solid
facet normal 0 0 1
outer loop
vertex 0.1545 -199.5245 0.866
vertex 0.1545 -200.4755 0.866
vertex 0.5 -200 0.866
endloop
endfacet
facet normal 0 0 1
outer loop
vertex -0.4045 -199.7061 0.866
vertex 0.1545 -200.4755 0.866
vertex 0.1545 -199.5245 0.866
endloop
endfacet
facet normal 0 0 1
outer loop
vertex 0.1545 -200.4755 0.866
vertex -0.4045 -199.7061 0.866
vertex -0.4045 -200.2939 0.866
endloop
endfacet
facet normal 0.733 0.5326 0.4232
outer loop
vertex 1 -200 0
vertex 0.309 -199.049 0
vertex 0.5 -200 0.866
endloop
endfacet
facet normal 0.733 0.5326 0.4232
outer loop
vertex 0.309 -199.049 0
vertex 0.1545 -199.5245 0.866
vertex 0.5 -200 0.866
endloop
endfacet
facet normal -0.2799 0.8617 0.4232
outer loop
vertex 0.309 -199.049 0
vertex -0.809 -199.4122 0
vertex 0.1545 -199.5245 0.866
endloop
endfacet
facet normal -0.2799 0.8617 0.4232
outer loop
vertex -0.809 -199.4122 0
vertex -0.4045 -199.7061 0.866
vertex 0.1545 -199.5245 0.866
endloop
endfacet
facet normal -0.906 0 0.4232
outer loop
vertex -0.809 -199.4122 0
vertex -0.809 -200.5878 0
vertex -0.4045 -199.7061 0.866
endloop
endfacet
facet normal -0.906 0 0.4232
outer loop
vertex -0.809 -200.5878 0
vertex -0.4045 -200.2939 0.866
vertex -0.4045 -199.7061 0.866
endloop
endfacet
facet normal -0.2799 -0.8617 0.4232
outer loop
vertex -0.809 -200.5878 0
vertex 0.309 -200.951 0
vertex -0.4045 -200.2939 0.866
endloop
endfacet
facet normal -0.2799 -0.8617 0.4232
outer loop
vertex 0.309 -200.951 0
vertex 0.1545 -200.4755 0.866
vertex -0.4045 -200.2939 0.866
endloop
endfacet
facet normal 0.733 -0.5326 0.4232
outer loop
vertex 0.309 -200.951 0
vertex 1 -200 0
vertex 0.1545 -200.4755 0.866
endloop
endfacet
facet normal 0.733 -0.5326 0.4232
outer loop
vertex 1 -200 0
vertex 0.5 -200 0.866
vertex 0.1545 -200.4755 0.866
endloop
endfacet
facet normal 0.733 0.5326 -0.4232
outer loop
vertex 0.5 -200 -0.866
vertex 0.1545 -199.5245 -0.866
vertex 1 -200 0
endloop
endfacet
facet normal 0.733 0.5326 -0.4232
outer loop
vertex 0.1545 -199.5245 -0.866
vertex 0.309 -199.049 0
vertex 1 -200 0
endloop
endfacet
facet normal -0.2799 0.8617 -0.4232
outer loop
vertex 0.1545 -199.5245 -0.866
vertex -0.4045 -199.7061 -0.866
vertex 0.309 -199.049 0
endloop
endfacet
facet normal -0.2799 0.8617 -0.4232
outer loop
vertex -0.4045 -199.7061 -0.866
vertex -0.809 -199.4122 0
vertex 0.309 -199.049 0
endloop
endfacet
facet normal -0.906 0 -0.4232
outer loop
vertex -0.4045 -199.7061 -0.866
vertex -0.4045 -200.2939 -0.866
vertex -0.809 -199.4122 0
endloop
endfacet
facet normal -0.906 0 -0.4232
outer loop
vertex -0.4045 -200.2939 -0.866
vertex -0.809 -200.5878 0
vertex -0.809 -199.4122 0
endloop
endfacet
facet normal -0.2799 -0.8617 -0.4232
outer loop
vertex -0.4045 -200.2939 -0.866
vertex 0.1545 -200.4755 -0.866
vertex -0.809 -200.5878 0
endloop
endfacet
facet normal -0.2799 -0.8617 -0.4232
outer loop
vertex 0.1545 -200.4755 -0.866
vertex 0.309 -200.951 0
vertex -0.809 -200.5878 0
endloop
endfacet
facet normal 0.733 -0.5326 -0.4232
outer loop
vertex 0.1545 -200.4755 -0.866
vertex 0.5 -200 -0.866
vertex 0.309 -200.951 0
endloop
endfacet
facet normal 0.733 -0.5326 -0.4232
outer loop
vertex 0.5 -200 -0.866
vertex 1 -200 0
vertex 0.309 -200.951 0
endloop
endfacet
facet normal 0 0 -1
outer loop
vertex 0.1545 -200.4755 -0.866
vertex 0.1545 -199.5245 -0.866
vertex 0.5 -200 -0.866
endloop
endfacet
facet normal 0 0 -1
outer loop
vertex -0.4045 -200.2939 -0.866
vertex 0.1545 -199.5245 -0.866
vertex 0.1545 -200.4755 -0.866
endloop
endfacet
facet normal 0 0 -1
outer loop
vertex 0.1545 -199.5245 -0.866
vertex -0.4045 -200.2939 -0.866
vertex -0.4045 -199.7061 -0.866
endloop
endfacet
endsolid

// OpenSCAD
// file: localfiles_subdir/localfiles_submodule.scad
module localfiles_submodule()
{
  linear_extrude(h=100) import("localfile.dxf");
  translate([-250,0,0]) linear_extrude(file="localfile.dxf");
  translate([0,350,0]) rotate_extrude(file="localfile.dxf");
  translate([250,0,0]) scale([200,200,50]) surface("localfile.dat");

  translate([0,-200,0]) sphere(r=dxf_dim(file="localfile.dxf", name="localfile")/2);
}
// main file
use <localfiles_subdir/localfiles_submodule.scad>

localfiles_submodule();
